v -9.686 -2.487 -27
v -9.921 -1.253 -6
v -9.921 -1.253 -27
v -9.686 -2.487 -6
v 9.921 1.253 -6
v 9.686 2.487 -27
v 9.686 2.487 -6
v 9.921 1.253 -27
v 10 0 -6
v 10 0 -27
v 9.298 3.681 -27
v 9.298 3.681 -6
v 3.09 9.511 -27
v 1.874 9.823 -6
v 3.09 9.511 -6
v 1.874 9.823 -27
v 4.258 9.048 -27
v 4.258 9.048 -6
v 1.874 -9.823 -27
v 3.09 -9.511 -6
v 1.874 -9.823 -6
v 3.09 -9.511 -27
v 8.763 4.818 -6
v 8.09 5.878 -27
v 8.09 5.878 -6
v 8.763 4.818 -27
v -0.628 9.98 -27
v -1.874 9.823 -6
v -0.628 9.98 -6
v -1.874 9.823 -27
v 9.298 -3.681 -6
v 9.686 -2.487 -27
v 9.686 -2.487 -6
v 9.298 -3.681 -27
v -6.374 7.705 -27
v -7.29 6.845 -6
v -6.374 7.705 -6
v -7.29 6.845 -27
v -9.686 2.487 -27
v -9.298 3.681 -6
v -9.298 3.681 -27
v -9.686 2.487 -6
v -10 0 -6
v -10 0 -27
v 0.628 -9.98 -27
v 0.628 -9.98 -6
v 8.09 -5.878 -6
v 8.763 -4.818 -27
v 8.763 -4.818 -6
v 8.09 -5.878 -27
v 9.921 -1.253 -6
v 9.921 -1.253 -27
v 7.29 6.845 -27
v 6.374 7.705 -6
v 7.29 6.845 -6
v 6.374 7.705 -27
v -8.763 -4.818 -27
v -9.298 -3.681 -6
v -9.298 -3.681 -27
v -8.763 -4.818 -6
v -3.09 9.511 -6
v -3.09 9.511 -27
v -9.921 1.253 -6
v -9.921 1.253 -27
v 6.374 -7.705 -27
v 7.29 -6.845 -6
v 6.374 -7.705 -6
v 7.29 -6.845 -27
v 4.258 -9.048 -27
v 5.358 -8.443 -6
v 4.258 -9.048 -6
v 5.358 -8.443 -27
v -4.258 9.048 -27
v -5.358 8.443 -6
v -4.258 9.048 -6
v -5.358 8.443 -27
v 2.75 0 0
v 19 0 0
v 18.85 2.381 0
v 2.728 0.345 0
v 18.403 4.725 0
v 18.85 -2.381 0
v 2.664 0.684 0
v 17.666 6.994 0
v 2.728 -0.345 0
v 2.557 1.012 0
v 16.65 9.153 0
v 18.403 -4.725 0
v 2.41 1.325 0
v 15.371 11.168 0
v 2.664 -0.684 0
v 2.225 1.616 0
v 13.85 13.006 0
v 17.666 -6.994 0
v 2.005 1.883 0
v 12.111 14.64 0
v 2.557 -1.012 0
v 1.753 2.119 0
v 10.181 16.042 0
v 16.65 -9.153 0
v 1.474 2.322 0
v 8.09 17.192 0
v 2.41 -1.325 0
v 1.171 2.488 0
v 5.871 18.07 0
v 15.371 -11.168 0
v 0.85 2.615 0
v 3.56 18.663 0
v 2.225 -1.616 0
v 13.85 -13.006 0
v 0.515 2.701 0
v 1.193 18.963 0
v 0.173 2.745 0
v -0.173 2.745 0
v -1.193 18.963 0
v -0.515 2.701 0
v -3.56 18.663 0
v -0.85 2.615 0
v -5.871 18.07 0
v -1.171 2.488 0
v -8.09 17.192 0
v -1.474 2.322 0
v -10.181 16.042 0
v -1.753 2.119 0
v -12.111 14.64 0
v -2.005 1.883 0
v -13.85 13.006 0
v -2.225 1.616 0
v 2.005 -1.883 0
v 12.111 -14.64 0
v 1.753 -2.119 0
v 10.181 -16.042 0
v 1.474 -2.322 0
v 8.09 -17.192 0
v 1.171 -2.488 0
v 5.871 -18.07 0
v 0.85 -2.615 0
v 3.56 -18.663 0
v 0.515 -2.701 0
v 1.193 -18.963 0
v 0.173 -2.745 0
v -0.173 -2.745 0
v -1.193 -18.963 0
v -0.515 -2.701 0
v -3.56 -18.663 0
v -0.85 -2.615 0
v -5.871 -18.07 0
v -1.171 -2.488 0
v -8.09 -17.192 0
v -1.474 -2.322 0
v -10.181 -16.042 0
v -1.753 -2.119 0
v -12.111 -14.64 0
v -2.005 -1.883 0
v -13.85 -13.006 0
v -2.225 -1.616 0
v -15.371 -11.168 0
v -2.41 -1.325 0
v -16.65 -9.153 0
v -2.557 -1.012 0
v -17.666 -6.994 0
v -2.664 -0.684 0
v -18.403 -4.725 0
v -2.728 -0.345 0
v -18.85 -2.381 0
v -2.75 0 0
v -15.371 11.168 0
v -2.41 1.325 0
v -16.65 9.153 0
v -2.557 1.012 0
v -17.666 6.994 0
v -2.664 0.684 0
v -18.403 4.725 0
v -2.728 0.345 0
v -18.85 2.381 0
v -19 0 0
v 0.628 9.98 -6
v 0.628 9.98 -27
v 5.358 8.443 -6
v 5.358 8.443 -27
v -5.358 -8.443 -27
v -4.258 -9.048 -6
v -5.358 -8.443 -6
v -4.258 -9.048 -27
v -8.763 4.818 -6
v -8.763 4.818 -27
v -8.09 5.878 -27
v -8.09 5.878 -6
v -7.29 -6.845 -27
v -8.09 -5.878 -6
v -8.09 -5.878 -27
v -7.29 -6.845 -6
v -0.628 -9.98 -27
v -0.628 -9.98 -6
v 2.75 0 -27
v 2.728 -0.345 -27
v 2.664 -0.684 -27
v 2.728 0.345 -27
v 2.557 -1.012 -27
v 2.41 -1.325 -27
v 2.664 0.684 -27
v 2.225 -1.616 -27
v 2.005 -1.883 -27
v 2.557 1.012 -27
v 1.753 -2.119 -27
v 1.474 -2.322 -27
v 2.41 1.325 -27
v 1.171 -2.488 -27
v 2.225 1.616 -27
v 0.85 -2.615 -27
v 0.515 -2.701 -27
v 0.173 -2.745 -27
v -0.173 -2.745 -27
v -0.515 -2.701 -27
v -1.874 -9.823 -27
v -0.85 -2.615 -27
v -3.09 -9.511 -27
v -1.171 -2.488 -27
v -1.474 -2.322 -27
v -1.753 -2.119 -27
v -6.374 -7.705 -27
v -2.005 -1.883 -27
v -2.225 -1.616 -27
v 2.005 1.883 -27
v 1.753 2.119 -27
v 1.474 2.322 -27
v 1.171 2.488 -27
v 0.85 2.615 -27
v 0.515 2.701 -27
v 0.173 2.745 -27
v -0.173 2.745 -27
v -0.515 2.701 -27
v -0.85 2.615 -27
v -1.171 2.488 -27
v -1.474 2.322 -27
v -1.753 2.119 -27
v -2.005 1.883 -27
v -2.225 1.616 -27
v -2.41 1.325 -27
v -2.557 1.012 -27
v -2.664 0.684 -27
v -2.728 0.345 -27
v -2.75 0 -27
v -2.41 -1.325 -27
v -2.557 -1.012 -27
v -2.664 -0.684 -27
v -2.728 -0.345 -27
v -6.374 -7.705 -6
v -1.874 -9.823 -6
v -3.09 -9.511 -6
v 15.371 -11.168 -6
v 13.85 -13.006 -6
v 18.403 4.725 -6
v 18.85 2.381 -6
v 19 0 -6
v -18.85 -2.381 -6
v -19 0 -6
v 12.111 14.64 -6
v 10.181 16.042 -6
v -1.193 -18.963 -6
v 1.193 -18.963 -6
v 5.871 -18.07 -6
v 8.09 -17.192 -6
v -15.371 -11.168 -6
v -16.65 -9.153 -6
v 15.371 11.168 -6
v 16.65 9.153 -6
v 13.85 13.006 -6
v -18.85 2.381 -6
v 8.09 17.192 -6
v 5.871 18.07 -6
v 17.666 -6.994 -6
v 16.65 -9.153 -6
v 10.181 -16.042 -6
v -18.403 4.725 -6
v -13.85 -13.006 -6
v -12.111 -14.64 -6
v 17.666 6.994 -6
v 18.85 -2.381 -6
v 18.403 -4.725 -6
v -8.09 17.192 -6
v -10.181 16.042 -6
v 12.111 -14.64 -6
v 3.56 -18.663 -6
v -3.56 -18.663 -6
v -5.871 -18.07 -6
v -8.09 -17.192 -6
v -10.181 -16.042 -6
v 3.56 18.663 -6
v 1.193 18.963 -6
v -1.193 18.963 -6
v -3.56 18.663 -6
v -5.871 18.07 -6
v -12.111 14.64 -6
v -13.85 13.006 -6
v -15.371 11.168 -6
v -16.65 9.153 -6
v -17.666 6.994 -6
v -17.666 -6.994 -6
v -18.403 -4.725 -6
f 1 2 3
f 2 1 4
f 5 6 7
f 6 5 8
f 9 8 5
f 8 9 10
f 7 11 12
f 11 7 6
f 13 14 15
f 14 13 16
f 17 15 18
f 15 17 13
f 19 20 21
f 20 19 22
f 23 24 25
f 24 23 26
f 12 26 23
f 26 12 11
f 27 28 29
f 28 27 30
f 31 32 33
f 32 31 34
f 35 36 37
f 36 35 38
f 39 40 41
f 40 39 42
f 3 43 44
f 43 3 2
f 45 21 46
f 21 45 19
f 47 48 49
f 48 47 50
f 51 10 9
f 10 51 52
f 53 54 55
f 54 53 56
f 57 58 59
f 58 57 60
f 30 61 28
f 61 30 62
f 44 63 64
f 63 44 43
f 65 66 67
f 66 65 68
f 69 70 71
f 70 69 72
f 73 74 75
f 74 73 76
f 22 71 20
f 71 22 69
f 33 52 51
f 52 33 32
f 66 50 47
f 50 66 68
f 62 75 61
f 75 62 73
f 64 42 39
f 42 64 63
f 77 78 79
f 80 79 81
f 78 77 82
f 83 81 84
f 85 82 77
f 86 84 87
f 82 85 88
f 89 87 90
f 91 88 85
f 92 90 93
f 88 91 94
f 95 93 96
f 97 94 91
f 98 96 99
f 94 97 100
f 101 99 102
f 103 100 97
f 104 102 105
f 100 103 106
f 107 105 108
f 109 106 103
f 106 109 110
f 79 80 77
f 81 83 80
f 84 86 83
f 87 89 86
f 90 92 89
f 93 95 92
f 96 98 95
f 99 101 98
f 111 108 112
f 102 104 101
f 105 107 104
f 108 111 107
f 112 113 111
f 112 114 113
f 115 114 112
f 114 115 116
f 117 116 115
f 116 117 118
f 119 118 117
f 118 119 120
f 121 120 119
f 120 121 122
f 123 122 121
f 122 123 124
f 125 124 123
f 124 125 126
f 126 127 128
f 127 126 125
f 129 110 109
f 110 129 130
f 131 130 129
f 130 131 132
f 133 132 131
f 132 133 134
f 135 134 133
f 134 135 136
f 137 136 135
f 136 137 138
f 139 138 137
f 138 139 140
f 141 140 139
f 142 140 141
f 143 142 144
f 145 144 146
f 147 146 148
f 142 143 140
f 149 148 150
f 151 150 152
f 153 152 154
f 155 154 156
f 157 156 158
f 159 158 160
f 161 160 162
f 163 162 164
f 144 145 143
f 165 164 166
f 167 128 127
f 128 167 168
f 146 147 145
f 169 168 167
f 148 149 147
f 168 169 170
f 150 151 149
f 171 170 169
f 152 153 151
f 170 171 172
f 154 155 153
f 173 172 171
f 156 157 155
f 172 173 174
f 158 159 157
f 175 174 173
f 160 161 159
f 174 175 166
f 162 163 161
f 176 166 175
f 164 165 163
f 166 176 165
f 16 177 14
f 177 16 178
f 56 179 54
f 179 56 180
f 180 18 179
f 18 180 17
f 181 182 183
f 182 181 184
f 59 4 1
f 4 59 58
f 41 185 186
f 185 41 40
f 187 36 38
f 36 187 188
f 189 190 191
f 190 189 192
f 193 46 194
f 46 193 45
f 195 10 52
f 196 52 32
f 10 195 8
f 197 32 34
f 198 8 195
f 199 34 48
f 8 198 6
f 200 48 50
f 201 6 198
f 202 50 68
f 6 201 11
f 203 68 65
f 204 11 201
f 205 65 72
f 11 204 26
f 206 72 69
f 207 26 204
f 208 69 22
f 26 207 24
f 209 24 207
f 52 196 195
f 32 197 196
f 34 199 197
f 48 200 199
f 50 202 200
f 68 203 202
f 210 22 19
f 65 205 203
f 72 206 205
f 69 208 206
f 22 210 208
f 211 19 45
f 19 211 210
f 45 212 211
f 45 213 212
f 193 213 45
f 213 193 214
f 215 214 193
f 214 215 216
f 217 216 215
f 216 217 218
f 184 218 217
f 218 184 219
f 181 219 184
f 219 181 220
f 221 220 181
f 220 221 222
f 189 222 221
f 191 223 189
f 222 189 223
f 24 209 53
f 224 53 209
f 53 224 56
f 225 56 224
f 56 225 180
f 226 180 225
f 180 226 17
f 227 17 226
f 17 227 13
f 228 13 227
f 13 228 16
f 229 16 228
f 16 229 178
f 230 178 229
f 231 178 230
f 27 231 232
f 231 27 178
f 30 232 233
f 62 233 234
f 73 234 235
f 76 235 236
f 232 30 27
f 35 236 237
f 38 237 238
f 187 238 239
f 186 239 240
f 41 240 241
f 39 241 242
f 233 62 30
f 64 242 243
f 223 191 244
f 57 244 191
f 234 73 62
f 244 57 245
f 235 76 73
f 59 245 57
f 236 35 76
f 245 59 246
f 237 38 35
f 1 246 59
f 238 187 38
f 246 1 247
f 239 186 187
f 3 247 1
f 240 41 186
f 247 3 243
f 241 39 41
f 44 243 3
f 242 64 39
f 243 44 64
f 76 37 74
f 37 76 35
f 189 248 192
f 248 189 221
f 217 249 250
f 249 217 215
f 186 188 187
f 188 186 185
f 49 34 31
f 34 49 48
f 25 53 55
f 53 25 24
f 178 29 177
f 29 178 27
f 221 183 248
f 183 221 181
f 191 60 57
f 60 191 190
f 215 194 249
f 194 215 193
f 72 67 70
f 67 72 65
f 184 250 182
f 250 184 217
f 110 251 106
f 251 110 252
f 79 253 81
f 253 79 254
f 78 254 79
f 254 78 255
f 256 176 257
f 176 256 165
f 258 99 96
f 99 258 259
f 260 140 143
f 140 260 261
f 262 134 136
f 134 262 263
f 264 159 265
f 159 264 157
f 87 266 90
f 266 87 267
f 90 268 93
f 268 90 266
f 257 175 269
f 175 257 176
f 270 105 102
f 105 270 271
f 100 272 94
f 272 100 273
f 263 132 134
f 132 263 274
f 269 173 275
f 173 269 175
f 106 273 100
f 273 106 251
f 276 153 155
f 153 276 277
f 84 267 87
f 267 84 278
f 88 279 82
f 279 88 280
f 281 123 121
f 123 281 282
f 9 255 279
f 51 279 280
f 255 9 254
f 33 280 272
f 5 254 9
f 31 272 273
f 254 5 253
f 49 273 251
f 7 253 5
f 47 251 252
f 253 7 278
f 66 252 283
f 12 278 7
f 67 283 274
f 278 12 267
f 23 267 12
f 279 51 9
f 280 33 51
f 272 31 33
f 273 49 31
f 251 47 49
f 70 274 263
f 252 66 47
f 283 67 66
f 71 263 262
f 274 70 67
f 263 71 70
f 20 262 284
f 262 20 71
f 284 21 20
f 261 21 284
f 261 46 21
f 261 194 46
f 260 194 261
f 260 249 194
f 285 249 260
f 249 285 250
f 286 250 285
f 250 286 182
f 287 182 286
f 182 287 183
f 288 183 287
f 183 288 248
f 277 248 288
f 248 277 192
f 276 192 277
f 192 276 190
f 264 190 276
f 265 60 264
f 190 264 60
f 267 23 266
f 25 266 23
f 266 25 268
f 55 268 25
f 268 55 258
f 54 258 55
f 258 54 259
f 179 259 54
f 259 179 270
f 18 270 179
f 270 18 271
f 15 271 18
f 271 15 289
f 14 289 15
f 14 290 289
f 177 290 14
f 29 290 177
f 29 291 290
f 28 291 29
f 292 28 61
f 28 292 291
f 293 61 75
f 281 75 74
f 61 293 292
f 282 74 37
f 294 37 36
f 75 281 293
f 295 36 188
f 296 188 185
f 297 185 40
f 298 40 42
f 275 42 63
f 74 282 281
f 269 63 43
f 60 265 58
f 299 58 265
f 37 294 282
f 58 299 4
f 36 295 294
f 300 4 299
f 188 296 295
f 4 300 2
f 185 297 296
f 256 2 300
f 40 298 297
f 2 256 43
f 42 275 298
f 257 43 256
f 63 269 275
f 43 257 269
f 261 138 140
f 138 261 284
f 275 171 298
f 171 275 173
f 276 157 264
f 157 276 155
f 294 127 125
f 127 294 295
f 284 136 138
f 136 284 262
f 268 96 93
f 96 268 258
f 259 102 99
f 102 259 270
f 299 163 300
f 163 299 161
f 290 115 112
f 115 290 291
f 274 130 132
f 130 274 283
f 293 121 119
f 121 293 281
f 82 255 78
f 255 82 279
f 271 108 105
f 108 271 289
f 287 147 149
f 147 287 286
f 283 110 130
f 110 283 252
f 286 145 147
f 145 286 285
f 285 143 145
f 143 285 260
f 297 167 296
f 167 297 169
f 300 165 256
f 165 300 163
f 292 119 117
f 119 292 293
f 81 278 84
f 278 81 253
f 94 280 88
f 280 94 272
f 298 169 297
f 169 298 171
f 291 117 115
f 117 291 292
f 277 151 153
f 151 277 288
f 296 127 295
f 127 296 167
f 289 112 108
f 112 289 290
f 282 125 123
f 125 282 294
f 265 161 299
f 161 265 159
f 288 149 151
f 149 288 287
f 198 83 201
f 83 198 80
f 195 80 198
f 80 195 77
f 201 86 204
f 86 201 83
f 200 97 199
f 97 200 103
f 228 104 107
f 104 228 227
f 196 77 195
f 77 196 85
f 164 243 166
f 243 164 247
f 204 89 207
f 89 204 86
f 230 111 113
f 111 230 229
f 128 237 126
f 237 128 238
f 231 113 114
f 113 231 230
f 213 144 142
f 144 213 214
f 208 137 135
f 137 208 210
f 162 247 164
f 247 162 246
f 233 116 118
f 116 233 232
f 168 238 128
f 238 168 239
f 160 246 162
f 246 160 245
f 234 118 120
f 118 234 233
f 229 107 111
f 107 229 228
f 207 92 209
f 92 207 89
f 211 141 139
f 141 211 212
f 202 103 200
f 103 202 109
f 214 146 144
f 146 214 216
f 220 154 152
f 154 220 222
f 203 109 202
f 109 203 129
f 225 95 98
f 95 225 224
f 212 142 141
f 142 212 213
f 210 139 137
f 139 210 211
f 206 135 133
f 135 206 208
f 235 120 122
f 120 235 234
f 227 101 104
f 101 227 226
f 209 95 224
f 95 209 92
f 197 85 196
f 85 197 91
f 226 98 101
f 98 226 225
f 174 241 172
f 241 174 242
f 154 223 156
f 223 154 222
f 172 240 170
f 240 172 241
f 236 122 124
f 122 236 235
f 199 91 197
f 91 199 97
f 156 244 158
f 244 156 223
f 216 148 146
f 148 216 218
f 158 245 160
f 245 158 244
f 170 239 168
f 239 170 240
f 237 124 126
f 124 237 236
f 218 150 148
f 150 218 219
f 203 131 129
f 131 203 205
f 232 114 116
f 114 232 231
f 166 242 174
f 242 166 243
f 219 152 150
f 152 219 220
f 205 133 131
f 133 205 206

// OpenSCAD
$fn = 50;


difference() {
	union() {
		translate(v = [0, 0, -27.0000000000]) {
			cylinder(h = 27, r = 10.0000000000);
		}
		translate(v = [0, 0, -6.0000000000]) {
			cylinder(h = 6, r = 19.0000000000);
		}
	}
	union() {
		#translate(v = [0, 0, -27]) {
			cylinder(h = 27, r = 2.7500000000);
		}
	}
}
